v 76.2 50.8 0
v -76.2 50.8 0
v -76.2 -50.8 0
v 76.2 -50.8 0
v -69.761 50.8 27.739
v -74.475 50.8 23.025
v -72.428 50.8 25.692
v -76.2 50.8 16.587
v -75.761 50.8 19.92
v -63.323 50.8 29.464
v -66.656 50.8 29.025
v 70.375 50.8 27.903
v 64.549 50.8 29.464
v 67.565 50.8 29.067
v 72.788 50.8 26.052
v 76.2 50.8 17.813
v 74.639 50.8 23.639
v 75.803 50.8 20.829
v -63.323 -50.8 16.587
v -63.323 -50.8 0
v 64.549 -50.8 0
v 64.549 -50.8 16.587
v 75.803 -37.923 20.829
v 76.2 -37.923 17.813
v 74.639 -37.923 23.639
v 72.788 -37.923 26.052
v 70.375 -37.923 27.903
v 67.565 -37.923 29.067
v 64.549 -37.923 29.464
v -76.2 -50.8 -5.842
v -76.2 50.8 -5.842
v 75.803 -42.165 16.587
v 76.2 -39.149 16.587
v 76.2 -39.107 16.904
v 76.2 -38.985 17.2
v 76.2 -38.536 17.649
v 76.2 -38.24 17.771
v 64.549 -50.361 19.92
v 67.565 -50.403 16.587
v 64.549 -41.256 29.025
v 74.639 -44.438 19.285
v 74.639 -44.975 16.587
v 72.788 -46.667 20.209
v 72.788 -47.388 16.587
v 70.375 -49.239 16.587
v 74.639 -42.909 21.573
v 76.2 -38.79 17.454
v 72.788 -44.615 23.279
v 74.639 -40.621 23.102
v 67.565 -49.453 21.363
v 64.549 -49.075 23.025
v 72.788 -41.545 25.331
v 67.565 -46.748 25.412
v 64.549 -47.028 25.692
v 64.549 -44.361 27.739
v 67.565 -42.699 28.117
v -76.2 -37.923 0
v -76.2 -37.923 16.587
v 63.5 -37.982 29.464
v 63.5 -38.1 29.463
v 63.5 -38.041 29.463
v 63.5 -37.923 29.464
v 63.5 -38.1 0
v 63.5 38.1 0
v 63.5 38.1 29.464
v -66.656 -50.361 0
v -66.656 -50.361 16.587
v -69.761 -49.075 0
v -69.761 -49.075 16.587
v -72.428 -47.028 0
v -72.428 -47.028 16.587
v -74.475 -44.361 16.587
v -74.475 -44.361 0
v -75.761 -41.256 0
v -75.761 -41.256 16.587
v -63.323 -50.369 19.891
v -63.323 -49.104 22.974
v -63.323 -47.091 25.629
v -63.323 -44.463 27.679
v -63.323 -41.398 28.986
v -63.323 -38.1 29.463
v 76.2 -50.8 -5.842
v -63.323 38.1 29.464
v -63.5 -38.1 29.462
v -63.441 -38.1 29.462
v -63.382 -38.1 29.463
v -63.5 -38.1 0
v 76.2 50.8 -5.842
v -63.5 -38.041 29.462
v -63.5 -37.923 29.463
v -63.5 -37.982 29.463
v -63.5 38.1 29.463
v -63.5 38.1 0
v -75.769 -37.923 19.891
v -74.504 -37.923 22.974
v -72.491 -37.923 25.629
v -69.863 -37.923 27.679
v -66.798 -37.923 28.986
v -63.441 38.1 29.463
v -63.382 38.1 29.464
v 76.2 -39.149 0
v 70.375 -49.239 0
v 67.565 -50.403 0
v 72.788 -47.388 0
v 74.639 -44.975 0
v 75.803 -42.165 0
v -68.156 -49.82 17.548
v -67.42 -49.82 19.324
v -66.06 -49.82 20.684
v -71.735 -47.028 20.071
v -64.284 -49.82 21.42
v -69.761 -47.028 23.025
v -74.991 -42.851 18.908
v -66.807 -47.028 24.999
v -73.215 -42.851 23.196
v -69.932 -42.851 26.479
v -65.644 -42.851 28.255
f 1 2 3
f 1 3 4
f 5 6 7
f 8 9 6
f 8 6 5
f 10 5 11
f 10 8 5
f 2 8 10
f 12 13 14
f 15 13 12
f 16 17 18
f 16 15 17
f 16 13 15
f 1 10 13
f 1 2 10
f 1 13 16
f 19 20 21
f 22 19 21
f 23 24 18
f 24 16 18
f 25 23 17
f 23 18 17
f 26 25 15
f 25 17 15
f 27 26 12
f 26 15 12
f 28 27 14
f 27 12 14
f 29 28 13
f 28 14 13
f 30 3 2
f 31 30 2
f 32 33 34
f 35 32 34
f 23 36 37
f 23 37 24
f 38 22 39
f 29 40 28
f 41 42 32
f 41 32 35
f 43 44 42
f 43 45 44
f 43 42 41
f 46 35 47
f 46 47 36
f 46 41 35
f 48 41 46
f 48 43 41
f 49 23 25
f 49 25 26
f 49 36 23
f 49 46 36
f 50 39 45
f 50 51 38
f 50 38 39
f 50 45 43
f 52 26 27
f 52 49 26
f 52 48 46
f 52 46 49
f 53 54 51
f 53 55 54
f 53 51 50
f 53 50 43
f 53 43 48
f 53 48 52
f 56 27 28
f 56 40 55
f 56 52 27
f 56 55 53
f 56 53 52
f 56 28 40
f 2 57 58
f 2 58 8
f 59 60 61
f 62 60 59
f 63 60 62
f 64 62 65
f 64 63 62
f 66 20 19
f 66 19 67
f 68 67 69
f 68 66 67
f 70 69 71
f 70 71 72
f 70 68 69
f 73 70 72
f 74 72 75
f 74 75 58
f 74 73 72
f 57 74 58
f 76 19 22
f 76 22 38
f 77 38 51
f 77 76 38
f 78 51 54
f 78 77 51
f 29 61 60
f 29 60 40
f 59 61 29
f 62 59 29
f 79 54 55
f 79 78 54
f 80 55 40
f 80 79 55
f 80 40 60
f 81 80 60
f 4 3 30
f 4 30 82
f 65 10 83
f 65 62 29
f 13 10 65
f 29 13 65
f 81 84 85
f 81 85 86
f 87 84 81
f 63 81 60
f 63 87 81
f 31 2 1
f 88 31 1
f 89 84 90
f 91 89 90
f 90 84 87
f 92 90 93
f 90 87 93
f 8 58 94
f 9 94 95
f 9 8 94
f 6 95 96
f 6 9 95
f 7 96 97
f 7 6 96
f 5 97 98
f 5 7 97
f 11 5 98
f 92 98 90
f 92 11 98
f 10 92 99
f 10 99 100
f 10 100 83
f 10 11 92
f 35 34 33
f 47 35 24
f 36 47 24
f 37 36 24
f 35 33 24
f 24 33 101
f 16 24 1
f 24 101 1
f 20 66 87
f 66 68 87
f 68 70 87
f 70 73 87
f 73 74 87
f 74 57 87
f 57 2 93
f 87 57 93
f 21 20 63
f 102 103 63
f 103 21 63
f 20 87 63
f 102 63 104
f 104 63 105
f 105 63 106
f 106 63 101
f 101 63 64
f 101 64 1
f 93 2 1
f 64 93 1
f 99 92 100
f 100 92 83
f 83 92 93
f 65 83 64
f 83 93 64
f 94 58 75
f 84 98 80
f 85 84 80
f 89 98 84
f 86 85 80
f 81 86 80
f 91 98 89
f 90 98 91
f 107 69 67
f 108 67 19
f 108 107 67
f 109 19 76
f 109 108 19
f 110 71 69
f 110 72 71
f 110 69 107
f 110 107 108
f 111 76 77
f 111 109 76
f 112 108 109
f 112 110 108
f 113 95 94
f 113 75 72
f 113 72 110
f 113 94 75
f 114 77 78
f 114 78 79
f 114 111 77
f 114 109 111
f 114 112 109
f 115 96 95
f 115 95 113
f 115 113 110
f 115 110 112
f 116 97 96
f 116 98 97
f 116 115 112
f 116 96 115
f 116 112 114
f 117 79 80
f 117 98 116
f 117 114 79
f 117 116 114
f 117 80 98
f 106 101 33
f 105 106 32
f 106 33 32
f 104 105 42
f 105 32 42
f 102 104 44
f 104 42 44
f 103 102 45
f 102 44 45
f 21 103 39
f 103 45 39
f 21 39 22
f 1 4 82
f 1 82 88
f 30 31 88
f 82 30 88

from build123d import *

# Parameters (mm, degrees)
F0_W        = 152.4
F0_H        = 101.6
F0_W_2      = 127
F0_H_2      = 76.2
F1_DEPTH    = 29.464
F2_W        = 152.4
F2_H        = 101.6
F3_DEPTH    = 5.842
F4_T1_DEPTH = 165.9870757085
F5_T1_DEPTH = 171.7161227125
F5_T3_DEPTH = 48.7801227125
F5_T6_ANGLE = 90.0000000015
F6_R        = 11.650994652


# Not quite as in the source:
# - a fillet or chamfer that OpenCascade refuses, or shapes differently, is made with other operations: its cross-section is extruded or revolved along the edge and cut away or added


with BuildPart() as f1:
    # F0 (on Top) → F1 (new body)
    with BuildSketch(Plane.XY):
        Rectangle(F0_W, F0_H)
        Rectangle(F0_W_2, F0_H_2, mode=Mode.SUBTRACT)
    extrude(amount=F1_DEPTH)

    # F4: fillet of radius 12.8774151417 on 1 edges, made by hand

    # F4_s2 → F4_t1 (cut)
    with BuildSketch(Plane.XZ.offset(-82.9935378542)):
        with BuildLine():
            ThreePointArc((-76.2, 16.5865848583), (-72.4282924292, 25.6922924292), (-63.3225848583, 29.464))
            Line((-63.3225848583, 29.464), (-76.2, 29.464))
            Line((-76.2, 29.464), (-76.2, 16.5865848583))
        make_face()
    extrude(amount=F4_T1_DEPTH, mode=Mode.SUBTRACT)

    # F5: fillet of radius 12.8774151417 on 1 edges, made by hand

    # F5_s2 → F5_t1 (cut)
    with BuildSketch(Plane.YZ.offset(-63.3225848583)):
        with BuildLine():
            ThreePointArc((-50.8, 16.5865848583), (-47.0282924292, 25.6922924292), (-37.9225848583, 29.464))
            Line((-37.9225848583, 29.464), (-50.8, 29.464))
            Line((-50.8, 29.464), (-50.8, 16.5865848583))
        make_face()
    extrude(amount=F5_T1_DEPTH, mode=Mode.SUBTRACT)

    # F5_s4 → F5_t3 (cut)
    with BuildSketch(Plane.XY.offset(-32.1935378542)):
        with BuildLine():
            ThreePointArc((-63.3225848583, -50.8), (-72.4282924292, -47.0282924292), (-76.2, -37.9225848583))
            Line((-76.2, -37.9225848583), (-76.2, -50.8))
            Line((-76.2, -50.8), (-63.3225848583, -50.8))
        make_face()
    extrude(amount=F5_T3_DEPTH, mode=Mode.SUBTRACT)

    # F5_s5 → F5_t6 (revolve, cut)
    with BuildSketch(Plane.XY.offset(16.5865848585)):
        with BuildLine():
            ThreePointArc((-63.3225848583, -50.8), (-72.4282924292, -47.0282924292), (-76.2, -37.9225848583))
            Line((-76.2, -37.9225848583), (-76.2, -50.8))
            Line((-76.2, -50.8), (-63.3225848583, -50.8))
        make_face()
    revolve(axis=Axis((-63.3225848585, -50.8, 16.5865848585), (0, 1, 0)), revolution_arc=F5_T6_ANGLE, mode=Mode.SUBTRACT)

    # F6
    f6_edges = [f1.edges().sort_by_distance(p)[0] for p in [
        (76.2, 6.438708, 29.464),
    ]]
    fillet(f6_edges, radius=F6_R)


with BuildPart() as f3:
    # F2 (on Top) → F3 (new body)
    with BuildSketch(Plane.XY):
        Rectangle(F2_W, F2_H)
    extrude(amount=-F3_DEPTH)


solid = Compound([f1.part, f3.part])
